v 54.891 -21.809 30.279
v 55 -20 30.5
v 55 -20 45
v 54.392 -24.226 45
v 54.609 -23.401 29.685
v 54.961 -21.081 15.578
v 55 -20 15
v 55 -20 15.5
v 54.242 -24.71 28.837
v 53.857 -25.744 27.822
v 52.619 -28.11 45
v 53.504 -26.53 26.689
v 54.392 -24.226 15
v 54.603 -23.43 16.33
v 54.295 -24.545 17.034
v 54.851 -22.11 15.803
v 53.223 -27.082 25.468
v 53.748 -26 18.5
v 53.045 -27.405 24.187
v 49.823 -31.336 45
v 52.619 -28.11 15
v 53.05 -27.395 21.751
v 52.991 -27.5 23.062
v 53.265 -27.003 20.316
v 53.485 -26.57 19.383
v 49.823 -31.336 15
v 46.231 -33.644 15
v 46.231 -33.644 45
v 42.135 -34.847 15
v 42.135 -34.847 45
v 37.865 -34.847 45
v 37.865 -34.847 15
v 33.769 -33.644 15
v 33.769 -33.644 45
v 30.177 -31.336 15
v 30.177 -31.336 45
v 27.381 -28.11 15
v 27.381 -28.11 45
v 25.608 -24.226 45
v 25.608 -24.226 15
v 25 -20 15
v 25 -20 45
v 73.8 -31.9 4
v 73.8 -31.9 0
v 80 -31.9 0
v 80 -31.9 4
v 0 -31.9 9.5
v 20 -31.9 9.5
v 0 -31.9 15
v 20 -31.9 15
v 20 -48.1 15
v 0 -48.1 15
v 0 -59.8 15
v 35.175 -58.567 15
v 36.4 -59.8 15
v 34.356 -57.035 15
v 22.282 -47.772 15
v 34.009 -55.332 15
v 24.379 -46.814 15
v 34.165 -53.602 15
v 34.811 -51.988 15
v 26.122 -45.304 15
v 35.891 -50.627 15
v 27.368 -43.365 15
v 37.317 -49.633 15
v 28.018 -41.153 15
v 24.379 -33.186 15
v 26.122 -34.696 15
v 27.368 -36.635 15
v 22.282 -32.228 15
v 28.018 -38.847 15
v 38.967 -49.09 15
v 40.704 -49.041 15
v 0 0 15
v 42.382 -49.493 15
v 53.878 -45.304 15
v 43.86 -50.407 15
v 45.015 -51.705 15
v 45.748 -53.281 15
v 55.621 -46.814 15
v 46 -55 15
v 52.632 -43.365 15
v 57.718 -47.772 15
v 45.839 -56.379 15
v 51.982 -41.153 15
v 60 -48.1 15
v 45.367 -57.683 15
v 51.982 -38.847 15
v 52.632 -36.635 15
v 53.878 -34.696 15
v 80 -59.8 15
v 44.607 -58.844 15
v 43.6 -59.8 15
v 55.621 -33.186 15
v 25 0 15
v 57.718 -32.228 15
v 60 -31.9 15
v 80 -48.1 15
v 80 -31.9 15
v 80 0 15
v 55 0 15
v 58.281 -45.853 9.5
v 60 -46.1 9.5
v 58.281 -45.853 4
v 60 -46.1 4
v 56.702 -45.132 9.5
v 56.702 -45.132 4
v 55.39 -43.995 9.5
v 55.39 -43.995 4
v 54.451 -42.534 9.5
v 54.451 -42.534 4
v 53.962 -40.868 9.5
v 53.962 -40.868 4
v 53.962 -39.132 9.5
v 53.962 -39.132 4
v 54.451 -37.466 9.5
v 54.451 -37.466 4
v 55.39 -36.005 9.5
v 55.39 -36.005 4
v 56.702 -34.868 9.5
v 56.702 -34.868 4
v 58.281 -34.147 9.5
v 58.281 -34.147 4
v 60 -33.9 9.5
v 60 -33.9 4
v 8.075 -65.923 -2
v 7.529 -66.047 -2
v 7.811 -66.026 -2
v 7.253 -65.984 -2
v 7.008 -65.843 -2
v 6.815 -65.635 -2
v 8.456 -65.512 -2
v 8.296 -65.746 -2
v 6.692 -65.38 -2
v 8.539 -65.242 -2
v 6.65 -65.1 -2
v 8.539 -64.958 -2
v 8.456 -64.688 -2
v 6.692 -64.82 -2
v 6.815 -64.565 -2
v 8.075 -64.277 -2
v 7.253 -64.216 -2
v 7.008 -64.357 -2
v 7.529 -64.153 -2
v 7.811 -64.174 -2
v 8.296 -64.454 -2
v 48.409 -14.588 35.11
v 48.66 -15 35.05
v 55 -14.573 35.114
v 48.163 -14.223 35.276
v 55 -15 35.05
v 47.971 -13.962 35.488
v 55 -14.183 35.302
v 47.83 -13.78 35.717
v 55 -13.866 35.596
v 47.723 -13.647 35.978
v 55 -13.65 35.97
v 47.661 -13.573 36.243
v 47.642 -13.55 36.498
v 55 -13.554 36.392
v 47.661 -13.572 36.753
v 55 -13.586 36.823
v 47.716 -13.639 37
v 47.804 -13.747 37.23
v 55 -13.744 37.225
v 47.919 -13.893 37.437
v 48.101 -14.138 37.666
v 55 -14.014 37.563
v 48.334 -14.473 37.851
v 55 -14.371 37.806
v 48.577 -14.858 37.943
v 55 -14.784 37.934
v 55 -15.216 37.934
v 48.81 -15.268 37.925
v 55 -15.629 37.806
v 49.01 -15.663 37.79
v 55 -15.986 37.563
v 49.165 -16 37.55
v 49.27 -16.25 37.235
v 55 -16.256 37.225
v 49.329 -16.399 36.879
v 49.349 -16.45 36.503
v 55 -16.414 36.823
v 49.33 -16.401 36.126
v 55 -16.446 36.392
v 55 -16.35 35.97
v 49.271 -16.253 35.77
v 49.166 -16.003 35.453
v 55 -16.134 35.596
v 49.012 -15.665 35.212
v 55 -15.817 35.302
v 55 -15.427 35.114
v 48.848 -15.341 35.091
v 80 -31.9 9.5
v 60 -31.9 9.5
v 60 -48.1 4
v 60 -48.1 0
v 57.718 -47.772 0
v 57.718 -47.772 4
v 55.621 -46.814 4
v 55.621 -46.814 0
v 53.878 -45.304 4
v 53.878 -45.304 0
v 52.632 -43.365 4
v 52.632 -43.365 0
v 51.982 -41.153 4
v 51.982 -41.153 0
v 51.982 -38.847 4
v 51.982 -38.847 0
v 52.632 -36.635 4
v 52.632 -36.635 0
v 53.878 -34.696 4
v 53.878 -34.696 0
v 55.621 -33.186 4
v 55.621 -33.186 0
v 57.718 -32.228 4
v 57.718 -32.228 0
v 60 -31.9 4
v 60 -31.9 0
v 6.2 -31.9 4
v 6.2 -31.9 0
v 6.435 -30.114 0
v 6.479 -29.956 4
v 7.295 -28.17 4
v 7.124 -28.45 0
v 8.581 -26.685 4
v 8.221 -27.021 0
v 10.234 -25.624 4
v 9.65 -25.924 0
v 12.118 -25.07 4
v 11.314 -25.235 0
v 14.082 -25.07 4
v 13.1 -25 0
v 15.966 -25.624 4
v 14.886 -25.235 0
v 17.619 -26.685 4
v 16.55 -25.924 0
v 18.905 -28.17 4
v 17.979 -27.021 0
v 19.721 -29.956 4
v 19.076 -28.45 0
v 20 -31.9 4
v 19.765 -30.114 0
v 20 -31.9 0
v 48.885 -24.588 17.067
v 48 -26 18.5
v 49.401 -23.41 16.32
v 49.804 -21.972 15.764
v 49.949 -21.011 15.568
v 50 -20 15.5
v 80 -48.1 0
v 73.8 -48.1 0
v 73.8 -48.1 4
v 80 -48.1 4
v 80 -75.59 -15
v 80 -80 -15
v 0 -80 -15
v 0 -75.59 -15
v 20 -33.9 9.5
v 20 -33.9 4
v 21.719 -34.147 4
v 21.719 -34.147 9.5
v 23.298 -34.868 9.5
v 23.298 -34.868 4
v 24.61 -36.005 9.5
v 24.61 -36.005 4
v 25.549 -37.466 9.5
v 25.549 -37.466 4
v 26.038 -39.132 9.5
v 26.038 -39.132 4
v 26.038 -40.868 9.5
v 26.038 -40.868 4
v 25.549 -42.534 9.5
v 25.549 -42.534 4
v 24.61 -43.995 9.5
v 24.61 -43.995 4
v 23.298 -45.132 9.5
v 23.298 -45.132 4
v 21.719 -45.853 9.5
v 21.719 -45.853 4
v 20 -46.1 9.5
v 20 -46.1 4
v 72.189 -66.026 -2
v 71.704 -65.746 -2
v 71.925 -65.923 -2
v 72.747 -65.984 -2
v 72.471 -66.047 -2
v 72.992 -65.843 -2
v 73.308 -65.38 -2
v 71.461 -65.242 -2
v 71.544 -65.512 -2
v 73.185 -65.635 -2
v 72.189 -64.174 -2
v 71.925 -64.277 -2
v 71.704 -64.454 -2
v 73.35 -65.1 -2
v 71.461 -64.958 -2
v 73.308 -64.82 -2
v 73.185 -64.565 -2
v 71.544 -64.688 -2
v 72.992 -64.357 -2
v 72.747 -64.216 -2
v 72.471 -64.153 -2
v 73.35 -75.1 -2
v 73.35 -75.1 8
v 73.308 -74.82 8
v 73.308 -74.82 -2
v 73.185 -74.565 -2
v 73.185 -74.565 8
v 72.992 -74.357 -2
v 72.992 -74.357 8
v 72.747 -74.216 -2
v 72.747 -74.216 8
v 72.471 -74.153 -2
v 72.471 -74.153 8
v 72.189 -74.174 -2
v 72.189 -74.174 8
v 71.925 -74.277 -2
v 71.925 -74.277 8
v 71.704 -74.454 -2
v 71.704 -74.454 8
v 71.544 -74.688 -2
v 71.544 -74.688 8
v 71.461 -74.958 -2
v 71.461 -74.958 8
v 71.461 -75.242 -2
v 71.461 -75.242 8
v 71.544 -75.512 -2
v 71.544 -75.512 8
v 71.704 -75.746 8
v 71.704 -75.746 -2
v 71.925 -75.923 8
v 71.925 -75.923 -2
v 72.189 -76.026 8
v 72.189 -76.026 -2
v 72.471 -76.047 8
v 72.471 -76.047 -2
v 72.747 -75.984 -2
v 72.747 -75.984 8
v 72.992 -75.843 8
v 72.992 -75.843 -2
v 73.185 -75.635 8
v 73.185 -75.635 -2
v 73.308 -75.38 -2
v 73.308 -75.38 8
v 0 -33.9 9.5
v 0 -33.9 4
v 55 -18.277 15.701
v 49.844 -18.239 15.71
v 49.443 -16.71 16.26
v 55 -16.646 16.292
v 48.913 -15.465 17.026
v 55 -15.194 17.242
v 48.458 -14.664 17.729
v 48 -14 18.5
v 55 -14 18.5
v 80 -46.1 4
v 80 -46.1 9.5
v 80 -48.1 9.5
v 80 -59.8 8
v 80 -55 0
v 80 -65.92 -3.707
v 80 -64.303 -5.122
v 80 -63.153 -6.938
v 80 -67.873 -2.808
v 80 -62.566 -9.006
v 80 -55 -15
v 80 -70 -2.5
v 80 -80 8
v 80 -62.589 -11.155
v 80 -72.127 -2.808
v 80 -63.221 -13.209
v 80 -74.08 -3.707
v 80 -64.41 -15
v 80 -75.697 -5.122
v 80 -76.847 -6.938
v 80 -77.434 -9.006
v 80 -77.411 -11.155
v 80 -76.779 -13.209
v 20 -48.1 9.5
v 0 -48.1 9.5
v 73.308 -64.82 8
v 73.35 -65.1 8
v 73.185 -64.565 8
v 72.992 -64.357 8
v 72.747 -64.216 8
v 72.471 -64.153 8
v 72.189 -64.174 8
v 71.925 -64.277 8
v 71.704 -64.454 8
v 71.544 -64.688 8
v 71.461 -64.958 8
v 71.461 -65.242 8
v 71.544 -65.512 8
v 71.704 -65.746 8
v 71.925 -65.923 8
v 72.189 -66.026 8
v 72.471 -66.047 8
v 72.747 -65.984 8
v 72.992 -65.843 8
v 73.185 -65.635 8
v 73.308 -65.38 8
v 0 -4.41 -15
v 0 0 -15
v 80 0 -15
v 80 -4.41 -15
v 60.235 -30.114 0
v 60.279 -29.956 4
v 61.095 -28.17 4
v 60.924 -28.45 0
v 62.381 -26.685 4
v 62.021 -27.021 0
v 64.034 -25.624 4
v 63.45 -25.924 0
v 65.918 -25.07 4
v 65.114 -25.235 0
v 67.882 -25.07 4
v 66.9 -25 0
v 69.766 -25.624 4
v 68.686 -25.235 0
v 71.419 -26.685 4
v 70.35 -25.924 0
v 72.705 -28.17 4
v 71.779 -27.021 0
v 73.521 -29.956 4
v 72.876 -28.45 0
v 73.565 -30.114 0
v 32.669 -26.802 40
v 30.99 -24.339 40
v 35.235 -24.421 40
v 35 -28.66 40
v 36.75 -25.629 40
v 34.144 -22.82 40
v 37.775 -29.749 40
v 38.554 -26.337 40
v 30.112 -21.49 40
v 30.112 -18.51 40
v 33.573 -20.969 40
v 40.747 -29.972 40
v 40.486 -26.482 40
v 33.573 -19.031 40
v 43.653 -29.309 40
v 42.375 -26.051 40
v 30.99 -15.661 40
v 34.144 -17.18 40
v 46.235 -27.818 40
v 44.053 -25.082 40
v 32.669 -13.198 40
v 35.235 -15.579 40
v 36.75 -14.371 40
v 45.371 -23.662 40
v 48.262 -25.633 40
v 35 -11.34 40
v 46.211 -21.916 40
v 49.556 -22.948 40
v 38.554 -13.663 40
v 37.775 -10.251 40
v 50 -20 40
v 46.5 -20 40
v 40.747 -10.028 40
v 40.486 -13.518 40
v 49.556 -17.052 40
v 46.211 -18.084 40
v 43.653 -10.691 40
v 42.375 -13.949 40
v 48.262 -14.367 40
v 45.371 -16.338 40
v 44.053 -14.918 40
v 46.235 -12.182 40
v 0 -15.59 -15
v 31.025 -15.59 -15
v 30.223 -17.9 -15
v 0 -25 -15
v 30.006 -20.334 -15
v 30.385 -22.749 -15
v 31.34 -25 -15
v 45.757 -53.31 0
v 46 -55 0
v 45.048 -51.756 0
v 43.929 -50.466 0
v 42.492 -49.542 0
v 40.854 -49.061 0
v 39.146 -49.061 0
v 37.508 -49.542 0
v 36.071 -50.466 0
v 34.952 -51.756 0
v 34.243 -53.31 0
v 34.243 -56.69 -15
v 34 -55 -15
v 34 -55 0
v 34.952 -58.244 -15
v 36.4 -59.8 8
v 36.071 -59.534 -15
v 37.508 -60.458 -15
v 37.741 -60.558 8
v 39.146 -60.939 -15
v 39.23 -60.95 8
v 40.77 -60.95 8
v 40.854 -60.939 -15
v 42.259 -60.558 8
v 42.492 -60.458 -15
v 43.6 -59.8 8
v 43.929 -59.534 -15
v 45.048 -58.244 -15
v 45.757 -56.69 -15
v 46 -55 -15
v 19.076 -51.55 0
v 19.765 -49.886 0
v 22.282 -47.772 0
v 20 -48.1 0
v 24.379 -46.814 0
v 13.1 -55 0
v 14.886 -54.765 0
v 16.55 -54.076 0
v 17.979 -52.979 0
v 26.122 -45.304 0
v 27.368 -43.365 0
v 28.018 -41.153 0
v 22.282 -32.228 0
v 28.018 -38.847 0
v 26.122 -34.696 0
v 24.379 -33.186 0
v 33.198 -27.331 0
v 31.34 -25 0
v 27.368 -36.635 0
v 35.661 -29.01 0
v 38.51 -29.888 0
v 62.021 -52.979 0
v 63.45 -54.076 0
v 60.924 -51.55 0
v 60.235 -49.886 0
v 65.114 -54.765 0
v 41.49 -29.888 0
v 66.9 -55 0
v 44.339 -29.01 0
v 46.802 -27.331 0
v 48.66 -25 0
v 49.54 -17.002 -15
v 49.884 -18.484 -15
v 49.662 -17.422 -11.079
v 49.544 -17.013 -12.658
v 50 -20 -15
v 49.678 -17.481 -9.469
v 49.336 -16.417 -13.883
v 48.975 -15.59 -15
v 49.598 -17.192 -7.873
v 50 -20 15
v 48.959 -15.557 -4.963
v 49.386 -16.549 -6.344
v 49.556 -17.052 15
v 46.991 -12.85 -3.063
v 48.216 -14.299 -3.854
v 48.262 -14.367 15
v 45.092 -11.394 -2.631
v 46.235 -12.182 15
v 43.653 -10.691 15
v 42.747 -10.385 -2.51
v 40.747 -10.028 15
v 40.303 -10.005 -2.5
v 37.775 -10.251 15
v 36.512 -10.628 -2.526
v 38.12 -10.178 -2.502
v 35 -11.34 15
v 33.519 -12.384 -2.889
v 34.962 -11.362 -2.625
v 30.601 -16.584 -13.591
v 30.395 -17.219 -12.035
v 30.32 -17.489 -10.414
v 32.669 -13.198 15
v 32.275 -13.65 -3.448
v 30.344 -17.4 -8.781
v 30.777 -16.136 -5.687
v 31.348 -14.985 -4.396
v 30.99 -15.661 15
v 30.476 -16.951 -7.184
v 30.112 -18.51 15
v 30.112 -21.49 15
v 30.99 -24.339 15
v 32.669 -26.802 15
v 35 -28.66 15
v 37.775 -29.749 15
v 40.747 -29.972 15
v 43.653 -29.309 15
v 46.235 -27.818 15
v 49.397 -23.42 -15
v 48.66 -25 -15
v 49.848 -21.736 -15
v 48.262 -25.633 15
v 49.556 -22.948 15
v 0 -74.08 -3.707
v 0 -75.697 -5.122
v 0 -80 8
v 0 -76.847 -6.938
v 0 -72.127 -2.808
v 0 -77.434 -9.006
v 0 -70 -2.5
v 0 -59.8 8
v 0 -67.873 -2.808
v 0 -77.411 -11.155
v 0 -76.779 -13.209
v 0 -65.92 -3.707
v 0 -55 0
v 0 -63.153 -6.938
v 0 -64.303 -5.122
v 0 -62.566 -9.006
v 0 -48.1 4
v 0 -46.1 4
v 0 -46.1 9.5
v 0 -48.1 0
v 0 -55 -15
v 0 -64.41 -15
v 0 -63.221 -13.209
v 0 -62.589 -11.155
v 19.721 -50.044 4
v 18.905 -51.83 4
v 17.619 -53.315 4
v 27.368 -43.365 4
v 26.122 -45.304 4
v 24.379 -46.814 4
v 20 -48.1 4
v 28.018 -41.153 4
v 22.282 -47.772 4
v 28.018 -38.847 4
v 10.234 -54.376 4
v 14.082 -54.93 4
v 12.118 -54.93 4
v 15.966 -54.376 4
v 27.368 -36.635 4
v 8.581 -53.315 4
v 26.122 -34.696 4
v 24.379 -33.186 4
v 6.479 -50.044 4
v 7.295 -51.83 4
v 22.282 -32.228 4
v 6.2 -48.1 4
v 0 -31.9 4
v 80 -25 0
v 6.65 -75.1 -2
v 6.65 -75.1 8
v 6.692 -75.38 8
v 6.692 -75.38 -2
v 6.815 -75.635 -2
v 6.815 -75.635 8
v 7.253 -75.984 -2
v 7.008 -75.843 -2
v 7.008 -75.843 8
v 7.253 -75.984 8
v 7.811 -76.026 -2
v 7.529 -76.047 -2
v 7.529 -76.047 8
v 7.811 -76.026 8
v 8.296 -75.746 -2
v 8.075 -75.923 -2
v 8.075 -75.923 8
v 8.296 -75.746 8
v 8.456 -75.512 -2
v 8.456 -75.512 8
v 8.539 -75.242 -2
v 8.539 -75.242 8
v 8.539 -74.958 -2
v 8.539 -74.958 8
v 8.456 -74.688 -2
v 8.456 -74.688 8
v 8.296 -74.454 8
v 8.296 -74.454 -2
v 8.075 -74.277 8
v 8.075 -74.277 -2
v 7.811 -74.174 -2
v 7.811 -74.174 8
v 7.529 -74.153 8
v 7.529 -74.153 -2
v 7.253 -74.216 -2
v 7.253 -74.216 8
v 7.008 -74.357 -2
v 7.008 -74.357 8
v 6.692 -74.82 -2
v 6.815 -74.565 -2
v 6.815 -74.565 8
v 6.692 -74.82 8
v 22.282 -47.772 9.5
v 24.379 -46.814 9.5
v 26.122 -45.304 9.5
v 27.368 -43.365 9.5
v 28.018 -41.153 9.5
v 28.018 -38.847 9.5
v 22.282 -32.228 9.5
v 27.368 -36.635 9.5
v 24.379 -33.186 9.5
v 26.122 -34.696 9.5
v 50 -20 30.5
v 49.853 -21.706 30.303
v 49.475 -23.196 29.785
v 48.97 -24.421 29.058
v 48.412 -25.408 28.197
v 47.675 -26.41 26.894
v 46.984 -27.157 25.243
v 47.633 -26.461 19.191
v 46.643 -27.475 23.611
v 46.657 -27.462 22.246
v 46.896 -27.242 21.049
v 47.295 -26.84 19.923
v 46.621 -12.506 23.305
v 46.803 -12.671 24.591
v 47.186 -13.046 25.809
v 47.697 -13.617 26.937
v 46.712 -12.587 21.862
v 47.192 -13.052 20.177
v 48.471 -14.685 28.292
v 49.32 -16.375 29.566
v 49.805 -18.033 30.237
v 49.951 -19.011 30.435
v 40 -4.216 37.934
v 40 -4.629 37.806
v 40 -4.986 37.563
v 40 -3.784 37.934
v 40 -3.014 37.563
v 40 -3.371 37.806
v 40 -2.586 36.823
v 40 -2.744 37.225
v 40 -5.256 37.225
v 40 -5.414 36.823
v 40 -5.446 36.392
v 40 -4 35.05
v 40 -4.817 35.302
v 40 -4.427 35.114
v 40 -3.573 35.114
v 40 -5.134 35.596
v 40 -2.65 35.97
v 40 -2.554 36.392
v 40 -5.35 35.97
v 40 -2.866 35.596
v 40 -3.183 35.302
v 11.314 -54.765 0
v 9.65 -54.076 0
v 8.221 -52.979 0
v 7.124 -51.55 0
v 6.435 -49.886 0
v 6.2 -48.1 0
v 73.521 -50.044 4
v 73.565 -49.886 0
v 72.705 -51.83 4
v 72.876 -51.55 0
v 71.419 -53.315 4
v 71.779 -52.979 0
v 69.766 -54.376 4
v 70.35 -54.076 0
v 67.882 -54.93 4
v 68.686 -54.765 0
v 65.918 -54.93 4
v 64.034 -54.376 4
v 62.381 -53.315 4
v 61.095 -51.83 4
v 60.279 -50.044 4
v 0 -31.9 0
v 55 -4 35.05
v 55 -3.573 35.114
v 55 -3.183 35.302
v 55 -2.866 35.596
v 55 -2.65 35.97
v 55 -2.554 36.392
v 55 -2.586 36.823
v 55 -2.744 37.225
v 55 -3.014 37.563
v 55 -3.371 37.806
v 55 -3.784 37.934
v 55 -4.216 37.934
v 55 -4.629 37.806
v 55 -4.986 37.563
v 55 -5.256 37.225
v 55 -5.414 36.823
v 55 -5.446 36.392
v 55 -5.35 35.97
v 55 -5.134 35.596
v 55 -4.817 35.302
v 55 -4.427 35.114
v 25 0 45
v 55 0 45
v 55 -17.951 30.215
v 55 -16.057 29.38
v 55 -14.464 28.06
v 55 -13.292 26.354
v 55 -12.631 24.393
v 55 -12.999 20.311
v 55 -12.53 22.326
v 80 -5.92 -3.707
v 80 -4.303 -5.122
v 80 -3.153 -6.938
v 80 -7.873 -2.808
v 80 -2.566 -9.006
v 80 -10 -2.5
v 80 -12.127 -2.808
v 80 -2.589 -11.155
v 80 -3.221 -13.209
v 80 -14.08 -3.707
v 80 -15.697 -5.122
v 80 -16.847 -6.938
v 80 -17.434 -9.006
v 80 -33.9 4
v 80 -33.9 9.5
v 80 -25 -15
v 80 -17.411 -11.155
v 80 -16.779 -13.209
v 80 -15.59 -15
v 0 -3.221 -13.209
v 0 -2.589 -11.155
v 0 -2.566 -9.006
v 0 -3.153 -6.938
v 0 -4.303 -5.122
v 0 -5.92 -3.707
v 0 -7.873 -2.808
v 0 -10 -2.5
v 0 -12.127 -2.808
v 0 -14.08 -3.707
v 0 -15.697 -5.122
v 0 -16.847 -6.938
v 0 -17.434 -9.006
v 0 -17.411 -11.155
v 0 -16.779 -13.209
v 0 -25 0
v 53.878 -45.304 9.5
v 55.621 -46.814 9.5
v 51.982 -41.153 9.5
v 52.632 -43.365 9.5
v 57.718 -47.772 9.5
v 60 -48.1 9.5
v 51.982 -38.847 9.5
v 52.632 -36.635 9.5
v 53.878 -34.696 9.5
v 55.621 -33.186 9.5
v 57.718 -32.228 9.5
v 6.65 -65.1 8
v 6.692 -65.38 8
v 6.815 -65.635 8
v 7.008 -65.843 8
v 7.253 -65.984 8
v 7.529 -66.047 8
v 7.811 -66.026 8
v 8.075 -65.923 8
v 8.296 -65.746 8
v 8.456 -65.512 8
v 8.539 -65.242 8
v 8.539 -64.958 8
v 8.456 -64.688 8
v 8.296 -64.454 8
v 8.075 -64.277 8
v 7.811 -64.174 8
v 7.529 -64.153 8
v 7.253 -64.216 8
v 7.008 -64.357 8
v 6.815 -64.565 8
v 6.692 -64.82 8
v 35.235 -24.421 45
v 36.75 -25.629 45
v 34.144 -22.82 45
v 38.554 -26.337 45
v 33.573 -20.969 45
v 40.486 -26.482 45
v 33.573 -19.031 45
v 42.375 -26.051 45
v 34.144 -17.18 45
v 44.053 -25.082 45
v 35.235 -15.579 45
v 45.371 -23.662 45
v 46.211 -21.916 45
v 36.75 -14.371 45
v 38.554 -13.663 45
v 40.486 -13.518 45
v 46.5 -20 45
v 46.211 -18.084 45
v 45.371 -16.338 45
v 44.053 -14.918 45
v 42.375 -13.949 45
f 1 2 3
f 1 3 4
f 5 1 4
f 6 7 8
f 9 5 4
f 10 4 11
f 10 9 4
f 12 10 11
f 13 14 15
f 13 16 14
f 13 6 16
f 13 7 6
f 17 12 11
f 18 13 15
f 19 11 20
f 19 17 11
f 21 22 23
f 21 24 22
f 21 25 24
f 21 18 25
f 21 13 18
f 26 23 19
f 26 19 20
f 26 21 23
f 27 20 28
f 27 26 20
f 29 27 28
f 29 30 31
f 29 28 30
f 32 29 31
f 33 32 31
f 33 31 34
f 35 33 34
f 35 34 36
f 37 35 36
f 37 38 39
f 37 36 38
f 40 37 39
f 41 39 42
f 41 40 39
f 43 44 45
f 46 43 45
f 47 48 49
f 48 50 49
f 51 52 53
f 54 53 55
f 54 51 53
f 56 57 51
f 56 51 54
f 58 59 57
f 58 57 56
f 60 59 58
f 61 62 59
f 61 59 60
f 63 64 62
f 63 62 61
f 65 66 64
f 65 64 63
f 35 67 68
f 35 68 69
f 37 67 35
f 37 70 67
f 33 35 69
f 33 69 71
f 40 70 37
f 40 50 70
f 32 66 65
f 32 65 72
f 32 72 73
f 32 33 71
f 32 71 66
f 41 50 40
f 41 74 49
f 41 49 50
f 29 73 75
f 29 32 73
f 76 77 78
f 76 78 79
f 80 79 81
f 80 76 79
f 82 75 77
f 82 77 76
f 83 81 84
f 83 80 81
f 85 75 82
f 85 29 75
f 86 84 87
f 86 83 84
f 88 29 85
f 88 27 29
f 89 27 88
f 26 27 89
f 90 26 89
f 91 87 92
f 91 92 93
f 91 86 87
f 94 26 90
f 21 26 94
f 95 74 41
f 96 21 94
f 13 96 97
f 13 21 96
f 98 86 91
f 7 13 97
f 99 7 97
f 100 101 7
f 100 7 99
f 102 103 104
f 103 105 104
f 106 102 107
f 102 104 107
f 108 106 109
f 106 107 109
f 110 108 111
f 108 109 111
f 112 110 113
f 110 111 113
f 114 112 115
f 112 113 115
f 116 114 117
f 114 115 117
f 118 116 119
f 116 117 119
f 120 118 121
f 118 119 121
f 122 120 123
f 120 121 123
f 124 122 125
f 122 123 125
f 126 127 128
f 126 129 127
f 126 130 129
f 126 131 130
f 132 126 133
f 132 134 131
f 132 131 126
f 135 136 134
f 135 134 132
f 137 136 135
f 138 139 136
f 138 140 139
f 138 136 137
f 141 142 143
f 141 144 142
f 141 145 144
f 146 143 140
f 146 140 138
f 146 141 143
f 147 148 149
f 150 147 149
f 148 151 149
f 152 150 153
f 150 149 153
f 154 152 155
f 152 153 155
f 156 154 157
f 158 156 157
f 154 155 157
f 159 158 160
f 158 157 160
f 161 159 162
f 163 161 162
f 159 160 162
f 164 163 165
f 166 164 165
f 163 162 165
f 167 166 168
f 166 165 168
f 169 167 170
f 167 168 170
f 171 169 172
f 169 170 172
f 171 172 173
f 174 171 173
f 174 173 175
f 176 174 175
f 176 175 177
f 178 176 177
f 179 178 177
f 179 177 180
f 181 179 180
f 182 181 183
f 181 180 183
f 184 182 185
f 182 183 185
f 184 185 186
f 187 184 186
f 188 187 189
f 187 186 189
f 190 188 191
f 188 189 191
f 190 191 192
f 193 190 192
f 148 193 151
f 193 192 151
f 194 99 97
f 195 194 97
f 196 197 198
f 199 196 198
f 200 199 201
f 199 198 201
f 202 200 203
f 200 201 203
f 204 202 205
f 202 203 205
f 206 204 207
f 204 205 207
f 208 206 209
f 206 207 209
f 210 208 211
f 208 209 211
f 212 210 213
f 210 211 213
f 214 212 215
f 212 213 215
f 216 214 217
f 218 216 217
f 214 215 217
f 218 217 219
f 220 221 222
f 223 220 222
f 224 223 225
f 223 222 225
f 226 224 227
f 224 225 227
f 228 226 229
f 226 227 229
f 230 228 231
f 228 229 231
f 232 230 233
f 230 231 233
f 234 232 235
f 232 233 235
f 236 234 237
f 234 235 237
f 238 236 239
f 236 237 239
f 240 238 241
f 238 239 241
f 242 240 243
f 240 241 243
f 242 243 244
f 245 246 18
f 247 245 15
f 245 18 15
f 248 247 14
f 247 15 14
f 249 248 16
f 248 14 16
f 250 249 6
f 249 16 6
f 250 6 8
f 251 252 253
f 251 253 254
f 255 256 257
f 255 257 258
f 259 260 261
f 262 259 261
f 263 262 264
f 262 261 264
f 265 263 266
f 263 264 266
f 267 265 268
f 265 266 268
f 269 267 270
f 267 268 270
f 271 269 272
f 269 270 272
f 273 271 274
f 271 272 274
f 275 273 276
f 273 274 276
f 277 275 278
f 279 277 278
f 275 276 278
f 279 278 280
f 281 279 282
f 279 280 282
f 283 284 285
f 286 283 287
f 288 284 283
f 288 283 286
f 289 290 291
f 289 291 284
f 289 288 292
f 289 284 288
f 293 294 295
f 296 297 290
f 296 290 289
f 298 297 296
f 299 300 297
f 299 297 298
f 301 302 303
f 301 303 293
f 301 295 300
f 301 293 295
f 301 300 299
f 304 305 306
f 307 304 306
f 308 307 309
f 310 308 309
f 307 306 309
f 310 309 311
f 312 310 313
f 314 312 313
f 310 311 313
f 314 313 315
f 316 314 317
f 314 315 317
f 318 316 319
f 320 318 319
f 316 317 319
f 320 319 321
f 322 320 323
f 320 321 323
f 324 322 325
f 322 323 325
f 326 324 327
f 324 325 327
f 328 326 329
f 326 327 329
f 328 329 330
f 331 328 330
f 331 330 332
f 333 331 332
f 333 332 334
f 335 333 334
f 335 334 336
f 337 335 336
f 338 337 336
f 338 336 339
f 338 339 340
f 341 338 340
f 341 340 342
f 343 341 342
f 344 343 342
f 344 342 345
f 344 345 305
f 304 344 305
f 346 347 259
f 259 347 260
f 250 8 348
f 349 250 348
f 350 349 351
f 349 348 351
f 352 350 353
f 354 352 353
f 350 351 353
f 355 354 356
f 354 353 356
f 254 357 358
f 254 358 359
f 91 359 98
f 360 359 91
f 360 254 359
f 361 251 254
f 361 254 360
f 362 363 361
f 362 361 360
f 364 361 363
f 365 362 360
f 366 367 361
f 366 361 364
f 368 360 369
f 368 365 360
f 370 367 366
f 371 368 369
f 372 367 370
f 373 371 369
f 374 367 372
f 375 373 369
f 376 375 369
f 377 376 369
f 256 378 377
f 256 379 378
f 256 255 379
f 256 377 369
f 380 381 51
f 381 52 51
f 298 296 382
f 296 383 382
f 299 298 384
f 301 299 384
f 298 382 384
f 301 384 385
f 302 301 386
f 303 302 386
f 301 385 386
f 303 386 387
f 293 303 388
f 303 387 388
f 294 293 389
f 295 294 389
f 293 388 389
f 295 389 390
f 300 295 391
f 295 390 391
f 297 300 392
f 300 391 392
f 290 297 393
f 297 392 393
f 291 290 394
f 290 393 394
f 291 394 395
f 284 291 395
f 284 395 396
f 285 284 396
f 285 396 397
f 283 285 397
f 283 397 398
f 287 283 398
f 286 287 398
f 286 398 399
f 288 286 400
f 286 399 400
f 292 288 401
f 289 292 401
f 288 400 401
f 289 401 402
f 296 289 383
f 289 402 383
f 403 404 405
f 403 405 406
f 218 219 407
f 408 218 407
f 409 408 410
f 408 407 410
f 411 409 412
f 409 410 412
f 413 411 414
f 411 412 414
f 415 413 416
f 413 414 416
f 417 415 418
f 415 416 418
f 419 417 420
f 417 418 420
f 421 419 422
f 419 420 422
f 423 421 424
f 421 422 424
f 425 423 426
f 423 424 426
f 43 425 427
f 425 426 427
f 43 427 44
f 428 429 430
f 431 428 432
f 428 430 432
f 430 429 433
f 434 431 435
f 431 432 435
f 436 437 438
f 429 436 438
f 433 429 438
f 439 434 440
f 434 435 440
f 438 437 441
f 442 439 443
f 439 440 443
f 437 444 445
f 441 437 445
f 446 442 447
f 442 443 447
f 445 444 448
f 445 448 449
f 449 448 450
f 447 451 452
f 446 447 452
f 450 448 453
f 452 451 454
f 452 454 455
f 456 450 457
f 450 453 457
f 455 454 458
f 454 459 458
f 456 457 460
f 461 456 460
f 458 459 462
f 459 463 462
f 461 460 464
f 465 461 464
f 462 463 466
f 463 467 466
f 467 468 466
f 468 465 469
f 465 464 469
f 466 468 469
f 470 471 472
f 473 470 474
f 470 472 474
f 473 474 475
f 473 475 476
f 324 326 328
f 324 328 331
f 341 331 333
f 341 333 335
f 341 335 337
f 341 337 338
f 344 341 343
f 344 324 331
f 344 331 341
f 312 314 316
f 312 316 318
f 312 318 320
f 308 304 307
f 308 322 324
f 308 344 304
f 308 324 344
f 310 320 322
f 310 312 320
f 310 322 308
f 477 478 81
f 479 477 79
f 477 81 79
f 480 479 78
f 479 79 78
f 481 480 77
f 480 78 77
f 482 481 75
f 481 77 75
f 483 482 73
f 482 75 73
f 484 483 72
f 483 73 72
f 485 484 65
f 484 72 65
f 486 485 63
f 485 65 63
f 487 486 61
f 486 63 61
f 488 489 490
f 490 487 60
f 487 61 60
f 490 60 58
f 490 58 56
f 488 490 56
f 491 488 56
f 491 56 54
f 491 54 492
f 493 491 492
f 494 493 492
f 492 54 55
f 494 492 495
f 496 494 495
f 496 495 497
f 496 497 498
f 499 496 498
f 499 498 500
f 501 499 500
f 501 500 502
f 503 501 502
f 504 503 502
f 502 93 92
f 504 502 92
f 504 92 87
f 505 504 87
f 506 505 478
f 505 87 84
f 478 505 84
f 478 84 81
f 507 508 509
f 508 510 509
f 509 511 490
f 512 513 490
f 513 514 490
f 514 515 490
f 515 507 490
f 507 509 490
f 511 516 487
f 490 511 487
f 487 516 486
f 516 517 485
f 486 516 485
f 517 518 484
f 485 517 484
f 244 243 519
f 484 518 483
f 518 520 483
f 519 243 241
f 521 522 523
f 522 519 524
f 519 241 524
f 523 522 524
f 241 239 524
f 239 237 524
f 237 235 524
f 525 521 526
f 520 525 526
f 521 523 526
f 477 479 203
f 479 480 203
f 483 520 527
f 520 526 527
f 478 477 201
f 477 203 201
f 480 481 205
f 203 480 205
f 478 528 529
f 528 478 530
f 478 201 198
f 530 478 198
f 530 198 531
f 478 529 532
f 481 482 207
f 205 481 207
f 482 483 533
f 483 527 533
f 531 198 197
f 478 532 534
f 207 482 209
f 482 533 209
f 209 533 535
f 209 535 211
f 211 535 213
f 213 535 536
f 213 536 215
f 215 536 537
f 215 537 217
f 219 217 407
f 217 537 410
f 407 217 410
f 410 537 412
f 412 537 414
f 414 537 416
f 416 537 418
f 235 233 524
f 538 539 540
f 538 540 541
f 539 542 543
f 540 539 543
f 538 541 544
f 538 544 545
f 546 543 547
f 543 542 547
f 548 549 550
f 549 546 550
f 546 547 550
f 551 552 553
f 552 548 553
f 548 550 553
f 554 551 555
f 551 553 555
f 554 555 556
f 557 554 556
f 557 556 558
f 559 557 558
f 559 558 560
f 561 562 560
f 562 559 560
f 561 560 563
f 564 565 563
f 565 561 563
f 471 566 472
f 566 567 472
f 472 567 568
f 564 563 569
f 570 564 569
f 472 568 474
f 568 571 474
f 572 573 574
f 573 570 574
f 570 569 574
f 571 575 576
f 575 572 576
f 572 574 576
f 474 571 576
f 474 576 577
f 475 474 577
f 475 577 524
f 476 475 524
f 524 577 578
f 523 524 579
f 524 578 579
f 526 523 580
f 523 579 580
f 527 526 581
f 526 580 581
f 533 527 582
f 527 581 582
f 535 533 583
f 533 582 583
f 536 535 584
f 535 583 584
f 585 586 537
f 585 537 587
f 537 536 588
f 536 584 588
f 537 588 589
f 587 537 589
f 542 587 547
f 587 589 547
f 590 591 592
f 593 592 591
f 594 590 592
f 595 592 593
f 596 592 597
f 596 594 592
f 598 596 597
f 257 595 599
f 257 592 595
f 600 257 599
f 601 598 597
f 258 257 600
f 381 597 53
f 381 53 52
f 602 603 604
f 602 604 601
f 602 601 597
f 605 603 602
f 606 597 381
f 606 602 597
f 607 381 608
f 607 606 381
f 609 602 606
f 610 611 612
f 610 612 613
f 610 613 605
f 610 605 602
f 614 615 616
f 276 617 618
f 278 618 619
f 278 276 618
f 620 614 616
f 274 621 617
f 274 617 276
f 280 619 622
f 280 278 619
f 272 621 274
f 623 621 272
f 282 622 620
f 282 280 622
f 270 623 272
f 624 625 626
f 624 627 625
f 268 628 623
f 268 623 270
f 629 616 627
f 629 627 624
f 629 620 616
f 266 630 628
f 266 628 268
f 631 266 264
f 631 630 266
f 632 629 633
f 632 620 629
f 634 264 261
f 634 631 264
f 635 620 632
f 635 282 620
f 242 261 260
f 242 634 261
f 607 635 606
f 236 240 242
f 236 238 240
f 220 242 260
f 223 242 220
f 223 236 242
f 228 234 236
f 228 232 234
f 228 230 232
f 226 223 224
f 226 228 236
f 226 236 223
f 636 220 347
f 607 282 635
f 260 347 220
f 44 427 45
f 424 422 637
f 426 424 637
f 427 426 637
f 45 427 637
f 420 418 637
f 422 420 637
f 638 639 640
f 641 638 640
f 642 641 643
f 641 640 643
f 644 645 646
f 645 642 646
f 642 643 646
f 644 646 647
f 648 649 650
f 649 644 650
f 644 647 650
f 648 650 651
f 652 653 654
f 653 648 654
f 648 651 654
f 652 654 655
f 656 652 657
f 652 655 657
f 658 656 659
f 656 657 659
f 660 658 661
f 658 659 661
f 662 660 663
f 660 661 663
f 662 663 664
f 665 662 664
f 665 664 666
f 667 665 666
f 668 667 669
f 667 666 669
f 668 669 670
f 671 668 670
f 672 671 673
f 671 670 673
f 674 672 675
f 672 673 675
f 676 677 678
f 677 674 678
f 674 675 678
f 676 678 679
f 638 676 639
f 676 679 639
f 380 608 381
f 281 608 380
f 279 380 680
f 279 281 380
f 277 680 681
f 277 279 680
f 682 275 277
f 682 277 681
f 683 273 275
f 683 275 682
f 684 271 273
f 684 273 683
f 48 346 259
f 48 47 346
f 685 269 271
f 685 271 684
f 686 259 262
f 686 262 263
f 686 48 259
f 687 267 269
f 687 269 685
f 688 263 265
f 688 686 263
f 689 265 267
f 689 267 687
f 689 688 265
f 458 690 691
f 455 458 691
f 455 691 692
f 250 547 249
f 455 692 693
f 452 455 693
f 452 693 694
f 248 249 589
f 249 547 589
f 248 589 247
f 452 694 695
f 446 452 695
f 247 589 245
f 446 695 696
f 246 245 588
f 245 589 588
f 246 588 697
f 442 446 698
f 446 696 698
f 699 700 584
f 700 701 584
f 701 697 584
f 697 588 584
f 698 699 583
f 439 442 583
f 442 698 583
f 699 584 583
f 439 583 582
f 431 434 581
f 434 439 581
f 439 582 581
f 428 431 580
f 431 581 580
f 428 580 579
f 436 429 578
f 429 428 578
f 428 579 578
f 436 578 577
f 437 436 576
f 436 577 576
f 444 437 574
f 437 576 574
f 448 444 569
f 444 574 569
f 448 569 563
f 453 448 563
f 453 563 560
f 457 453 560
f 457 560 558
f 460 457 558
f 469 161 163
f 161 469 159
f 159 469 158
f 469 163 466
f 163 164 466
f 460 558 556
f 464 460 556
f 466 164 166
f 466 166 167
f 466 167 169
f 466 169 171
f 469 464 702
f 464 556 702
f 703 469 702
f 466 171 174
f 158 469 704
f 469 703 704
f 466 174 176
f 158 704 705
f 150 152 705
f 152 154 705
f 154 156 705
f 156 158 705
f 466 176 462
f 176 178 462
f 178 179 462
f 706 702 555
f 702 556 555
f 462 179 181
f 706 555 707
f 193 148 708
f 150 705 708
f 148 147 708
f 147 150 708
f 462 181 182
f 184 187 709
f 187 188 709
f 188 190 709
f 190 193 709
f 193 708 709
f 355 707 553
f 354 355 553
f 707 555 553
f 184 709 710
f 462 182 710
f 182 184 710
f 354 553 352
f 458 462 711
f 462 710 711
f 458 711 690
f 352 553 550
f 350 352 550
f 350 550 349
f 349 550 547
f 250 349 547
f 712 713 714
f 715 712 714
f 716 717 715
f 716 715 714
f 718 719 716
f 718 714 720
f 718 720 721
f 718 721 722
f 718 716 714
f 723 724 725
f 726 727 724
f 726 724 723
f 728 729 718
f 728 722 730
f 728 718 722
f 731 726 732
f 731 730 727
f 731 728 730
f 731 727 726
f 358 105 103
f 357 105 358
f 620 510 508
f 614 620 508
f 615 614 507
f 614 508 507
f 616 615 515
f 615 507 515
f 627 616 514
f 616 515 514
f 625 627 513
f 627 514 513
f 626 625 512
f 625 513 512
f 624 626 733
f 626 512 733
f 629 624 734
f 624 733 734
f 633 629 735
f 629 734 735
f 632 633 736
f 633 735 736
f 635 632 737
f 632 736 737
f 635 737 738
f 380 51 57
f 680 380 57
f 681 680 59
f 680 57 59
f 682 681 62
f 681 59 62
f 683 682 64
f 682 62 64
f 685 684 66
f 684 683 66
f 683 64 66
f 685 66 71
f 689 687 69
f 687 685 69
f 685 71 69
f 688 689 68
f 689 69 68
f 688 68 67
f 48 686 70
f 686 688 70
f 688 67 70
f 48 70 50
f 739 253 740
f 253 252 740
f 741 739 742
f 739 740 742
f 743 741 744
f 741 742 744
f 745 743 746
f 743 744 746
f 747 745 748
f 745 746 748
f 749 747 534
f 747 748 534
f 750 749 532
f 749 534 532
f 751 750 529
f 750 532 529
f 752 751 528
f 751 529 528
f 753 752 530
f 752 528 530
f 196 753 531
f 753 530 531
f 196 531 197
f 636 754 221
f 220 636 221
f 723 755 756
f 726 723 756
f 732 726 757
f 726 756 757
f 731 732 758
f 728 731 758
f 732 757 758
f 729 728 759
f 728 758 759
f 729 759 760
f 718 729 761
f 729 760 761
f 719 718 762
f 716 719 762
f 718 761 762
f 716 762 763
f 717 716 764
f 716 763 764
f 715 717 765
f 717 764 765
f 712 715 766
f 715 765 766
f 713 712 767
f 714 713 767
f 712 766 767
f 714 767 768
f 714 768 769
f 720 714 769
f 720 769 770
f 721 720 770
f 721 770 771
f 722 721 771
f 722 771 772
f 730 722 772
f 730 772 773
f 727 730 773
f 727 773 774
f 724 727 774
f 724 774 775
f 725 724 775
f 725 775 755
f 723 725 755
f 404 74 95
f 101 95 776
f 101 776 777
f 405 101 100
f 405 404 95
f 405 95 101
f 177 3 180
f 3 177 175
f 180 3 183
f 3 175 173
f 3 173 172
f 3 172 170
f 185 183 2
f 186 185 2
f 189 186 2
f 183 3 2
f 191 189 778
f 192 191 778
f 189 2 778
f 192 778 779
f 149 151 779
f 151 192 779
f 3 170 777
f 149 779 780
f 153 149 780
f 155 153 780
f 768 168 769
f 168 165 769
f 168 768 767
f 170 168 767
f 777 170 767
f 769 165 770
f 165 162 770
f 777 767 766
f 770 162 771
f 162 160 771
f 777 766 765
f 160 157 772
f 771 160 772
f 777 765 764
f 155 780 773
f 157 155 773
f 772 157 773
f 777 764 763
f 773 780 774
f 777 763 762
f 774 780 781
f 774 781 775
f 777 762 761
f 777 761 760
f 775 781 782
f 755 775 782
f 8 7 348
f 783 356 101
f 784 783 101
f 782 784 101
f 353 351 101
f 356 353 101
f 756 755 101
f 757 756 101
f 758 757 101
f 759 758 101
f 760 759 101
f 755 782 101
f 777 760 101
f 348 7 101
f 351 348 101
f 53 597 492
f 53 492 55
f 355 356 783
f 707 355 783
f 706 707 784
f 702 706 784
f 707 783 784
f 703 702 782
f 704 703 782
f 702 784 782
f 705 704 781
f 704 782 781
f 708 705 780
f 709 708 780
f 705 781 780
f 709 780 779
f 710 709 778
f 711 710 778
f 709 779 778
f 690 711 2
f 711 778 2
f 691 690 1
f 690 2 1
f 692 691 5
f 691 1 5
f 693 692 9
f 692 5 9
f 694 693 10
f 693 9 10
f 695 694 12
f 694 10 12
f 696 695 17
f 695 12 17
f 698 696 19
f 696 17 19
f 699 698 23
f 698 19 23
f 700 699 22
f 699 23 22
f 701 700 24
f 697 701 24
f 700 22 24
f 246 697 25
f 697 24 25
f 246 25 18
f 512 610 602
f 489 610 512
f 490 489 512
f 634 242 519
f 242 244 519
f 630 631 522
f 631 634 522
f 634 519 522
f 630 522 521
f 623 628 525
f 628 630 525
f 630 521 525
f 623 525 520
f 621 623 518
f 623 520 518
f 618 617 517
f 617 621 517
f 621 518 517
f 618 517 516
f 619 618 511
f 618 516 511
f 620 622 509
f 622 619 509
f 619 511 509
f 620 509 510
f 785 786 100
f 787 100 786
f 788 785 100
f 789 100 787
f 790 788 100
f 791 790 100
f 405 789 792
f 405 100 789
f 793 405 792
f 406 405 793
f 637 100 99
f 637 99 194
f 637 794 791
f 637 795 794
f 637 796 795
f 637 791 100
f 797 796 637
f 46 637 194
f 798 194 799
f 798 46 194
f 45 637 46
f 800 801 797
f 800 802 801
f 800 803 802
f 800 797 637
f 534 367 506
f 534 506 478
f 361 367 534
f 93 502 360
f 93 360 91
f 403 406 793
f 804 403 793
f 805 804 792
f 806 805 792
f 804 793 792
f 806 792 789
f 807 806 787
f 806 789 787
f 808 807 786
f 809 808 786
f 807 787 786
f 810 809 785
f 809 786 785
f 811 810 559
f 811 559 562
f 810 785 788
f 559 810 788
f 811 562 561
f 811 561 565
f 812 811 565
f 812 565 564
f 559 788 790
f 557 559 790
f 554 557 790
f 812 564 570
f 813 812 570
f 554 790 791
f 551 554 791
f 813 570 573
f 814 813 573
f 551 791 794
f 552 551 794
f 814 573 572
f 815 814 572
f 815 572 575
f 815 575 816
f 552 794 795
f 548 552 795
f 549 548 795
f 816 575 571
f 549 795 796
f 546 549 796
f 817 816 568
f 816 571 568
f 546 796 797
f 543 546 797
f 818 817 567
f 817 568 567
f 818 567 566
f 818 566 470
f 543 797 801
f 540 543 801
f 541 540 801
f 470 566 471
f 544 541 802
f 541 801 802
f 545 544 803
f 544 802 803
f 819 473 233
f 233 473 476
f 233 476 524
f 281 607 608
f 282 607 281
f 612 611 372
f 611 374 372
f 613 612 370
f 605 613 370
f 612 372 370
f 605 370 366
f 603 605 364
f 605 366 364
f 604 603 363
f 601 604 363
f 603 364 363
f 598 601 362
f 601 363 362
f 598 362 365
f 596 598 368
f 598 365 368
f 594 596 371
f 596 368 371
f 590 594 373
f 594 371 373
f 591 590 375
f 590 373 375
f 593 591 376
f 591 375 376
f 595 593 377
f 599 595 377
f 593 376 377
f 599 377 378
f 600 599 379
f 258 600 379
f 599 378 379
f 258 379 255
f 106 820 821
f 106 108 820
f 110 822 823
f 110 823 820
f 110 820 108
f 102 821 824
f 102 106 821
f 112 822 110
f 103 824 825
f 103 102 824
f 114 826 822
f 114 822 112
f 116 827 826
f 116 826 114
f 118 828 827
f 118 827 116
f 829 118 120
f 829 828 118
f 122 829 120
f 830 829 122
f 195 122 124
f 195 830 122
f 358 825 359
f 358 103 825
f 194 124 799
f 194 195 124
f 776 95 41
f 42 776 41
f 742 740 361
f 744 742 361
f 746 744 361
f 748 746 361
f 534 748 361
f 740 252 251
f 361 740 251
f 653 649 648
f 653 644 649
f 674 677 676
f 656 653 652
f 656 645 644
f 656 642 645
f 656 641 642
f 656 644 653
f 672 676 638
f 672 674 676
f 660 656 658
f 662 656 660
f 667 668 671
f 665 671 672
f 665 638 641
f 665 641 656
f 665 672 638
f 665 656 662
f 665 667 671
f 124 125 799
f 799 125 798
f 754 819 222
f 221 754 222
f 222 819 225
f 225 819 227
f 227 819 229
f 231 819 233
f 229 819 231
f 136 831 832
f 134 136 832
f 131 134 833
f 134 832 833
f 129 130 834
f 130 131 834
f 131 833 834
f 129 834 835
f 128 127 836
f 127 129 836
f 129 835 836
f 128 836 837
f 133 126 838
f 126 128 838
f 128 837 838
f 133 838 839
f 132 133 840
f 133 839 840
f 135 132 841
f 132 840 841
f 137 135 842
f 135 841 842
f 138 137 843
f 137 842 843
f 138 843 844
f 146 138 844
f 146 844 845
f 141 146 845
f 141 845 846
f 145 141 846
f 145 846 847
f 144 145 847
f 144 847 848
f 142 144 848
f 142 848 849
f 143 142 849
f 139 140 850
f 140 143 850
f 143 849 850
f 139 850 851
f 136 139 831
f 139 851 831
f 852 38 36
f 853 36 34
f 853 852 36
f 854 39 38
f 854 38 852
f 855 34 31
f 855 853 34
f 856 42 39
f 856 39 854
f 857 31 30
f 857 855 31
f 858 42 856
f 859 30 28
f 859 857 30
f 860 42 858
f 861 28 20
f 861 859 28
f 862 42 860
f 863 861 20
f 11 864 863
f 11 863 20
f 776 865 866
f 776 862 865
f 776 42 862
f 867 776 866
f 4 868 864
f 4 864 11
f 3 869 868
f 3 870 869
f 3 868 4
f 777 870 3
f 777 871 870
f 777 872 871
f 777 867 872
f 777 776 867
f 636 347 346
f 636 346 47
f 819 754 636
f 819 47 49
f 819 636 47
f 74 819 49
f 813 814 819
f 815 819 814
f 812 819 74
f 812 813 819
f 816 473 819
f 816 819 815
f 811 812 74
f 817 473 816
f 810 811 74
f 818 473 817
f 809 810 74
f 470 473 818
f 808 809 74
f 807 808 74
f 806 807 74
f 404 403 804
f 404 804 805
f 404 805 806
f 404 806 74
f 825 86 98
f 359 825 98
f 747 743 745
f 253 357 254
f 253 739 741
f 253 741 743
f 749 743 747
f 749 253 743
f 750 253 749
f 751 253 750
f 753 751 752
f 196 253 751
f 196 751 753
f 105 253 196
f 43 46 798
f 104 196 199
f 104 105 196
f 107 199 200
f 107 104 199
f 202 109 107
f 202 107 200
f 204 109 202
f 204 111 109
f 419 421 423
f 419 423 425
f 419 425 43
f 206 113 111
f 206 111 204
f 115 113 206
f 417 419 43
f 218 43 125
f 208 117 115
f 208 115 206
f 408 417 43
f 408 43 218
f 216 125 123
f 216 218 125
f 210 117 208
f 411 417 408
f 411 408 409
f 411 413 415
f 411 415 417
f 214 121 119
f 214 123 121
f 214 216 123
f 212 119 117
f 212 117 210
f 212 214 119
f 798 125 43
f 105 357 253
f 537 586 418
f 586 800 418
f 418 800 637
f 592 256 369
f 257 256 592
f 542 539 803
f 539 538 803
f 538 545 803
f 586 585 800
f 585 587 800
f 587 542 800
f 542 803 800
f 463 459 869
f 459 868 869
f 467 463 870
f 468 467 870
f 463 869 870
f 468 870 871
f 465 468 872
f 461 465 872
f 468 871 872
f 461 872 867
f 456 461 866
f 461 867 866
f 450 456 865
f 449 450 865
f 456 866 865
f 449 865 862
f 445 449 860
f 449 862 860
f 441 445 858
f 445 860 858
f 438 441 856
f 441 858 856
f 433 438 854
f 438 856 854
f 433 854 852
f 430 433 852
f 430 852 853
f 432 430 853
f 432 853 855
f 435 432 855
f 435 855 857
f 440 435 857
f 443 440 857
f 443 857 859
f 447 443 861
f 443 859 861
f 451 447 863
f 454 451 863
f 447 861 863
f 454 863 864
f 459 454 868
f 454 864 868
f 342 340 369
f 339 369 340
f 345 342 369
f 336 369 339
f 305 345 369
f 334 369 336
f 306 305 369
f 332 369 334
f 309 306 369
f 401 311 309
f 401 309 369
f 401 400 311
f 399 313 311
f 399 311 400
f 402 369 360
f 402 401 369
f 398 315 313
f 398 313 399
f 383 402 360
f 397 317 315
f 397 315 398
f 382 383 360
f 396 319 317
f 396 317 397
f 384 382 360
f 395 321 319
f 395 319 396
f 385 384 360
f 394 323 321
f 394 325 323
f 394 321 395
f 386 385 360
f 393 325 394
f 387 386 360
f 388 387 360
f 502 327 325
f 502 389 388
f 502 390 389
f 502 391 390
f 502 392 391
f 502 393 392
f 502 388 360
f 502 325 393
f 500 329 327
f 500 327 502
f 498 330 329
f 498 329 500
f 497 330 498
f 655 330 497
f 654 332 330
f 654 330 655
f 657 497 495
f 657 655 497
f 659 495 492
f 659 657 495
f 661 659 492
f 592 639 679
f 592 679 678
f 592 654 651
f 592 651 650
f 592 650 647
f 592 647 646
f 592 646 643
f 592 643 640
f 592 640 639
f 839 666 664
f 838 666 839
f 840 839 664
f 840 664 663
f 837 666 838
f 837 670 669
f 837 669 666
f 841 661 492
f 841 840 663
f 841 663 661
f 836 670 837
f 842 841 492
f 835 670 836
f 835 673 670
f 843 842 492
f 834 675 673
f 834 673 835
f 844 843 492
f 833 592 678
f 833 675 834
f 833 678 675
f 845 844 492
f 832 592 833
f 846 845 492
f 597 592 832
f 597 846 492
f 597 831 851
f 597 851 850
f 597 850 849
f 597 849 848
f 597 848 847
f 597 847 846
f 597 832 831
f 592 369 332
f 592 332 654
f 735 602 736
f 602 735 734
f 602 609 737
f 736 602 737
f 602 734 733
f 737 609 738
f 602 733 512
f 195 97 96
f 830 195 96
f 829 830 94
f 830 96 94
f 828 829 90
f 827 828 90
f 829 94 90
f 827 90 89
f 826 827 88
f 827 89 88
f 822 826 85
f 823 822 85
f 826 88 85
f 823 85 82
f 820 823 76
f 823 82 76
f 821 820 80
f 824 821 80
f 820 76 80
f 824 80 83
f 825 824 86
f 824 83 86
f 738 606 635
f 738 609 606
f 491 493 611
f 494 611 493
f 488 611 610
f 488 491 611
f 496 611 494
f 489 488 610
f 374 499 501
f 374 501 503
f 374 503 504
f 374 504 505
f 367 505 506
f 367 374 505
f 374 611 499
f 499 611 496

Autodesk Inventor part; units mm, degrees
ref_plane "YZ Plane" through (0, 0, 0) normal (1, 0, 0) x (0, 1, 0)
ref_plane "XZ Plane" through (0, 0, 0) normal (0, 1, 0) x (-1, 0, 0)
ref_plane "XY Plane" through (0, 0, 0) normal (0, 0, 1) x (1, 0, 0)
sketch "Sketch1" plane through (0, 0, 0) normal (0, 0, 1) x (1, 0, 0)
  line L0 (0, 0) -> (80, 0)
  line L1 (80, 0) -> (80, -80)
  line L2 (80, -80) -> (0, -80)
  line L3 (0, -80) -> (0, 0)
  dimension "d0" = 80
  dimension "d1" = 80
extrude "Extrusion1" add sketch "Sketch1" along normal blind 15
sketch "Sketch2" plane through (0, 0, 0) normal (0, 0, -1) x (-1, 0, 0)
  line L0 (0, 0) -> (-80, 0) projected
  circle A0 centre (-60, -40) radius 6.1
  line L1 (-80, 0) -> (-80, -80) projected
  line L2 (-60, -33.9) -> (-80, -33.9)
  line L3 (-80, -80) -> (-80, 0) projected
  line L4 (-60, -46.1) -> (-80, -46.1)
  line L5 (-80, -46.1) -> (-80, -33.9)
  dimension "d7" = 40
  dimension "d8" = 20
  dimension "d9" = 12.2
extrude "Extrusion2" cut sketch "Sketch2" against normal through all
sketch "Sketch3" plane through (0, 0, 0) normal (0, 0, -1) x (-1, 0, 0)
  arc A0 (-60, -46.1) -> (-60, -33.9) centre (-60, -40) ccw projected
  circle A1 centre (-60, -40) radius 8.1
  line L0 (-60, -31.9) -> (-80, -31.9)
  line L1 (-80, -33.9) -> (-80, 0) projected
  line L2 (-60, -48.1) -> (-80, -48.1)
  line L3 (-80, -48.1) -> (-80, -31.9)
  point P0 (0, 0)
  dimension "d12" = 16.2
extrude "Extrusion3" cut sketch "Sketch3" against normal blind 4
sketch "Sketch4" plane through (0, 0, 15) normal (0, 0, 1) x (1, 0, 0)
  line L0 (80, -31.9) -> (60, -31.9) projected
  arc A0 (60, -31.9) -> (60, -48.1) centre (60, -40) ccw projected
  line L1 (60, -48.1) -> (80, -48.1) projected
  line L2 (80, -46.1) -> (60, -46.1) projected
  arc A1 (60, -33.9) -> (60, -46.1) centre (60, -40) ccw projected
  line L3 (60, -33.9) -> (80, -33.9) projected
  line L4 (80, -33.9) -> (80, -31.9)
  line L5 (80, -33.9) -> (80, 0) projected
  line L6 (80, -46.1) -> (80, -48.1)
  line L7 (80, -80) -> (80, -46.1) projected
  point P0 (0, 0)
extrude "Extrusion4" cut sketch "Sketch4" against normal blind 5.5
sketch "Sketch5" plane through (0, 0, 0) normal (0, 0, -1) x (-1, 0, 0)
  arc A0 (-60, -46.1) -> (-60, -33.9) centre (-60, -40) ccw projected
  line L0 (-80, -31.9) -> (-60, -31.9) projected
  circle A1 centre (-60, -40) radius 8.1
  line L1 (-60, -31.9) -> (-60, -31.9)
  line L2 (-73.8, -31.9) -> (-73.8, -48.1)
  line L3 (-60, -48.1) -> (-60, -48.1)
  arc A2 (-60, -48.1) -> (-60, -31.9) centre (-60, -40) ccw projected
  line L4 (-60, -31.9) -> (-60, -31.9)
  line L5 (-60, -31.9) -> (-60, -31.9)
  line L6 (-60, -33.9) -> (-60, -46.1)
  arc A3 (-60, -31.9) -> (-73.8, -31.9) centre (-66.9, -31.9) ccw
  arc A4 (-73.8, -48.1) -> (-60, -48.1) centre (-66.9, -48.1) ccw
  point P0 (0, 0)
  dimension "d17" = 13.8
  dimension "d20" = 16.2
  dimension "d21" = 8.1
  dimension "d37" = 0
extrude "Extrusion5" cut sketch "Sketch5" against normal blind 4 contours A3 L0 | L0 A1 A4 L2
sketch "Sketch6" plane through (80, 0, 15) normal (1, 0, 0) x (0, 0, -1)
  line L0 (15, 0) -> (0, 0) projected
  line L1 (15, 0) -> (30, 0)
  line L2 (30, -25) -> (15, -25)
  line L3 (15, -25) -> (15, 0)
  line L4 (15, -80) -> (0, -80) projected
  line L5 (15, -80) -> (30, -80)
  line L6 (30, -55) -> (15, -55)
  line L7 (15, -55) -> (15, -80)
  arc A0 (30, -4.4098) -> (30, -15.5902) centre (25, -10) ccw
  arc A1 (30, -64.4098) -> (30, -75.5902) centre (25, -70) ccw
  line L8 (30, 0) -> (30, -4.4098)
  line L9 (30, -15.5902) -> (30, -25)
  line L10 (30, -80) -> (30, -75.5902)
  line L11 (30, -64.4098) -> (30, -55)
  dimension "d22" = 25
  dimension "d23" = 25
  dimension "d24" = 15
  dimension "d25" = 15
  dimension "d29" = 15
  dimension "d32" = 15
  dimension "d33" = 5
  dimension "d34" = 5
  dimension "d38" = 15
  dimension "d39" = 15
  dimension "d40" = 60
  dimension "d41" = 10
  dimension "d42" = 10
extrude "Extrusion6" add sketch "Sketch6" against normal blind 80
ref_plane "Work Plane1" through (40, -33.9, 4) normal (1, 0, 0) x (0, 0, -1)
mirror "Mirror1" about plane through (40, -33.9, 4) normal (1, 0, 0) of "Extrusion5", "Extrusion4", "Extrusion3", "Extrusion2"
sketch "Sketch8" plane through (80, -48.1, 4) normal (1, 0, 0) x (0, 0, -1)
  line L0 (-11, 0) -> (-11, -31.9) projected
  line L1 (-11, -31.9) -> (-4, -31.9)
  line L2 (-4, -31.9) -> (-4, -11.7)
  line L3 (-4, -11.7) -> (-11, -11.7)
  line L4 (-11, -11.7) -> (-11, -31.9)
  point P0 (4, 48.1)
  dimension "d49" = 20.2
  dimension "d50" = 7
extrude "Extrusion8" cut sketch "Sketch8" along normal through all both and the other way through all
sketch "Sketch9" plane through (80, -80, 8) normal (0, 0, 1) x (1, 0, 0)
  circle A0 centre (-7.6, 14.9) radius 0.95
  circle A1 centre (-7.6, 4.9) radius 0.95
  line L0 (0, 20.2) -> (0, 0) projected
  line L1 (0, 0) -> (-80, 0) projected
  point P0 (-80, 80)
  dimension "d53" = 1.9
  dimension "d54" = 1.9
  dimension "d55" = 7.6
  dimension "d56" = 7.6
  dimension "d57" = 10
  dimension "d58" = 4.9
extrude "Extrusion9" cut sketch "Sketch9" against normal blind 10
ref_plane "Work Plane2" through (40, -48.1, 4) normal (1, 0, 0) x (0, 0, -1)
mirror "Mirror2" about plane through (40, -48.1, 4) normal (1, 0, 0) of "Extrusion9"
sketch "Sketch10" plane through (0, 0, 15) normal (0, 0, 1) x (1, 0, 0)
  line L0 (80, -55) -> (0, -55) projected
  circle A0 centre (40, -55) radius 6
  point P0 (0, 0)
  dimension "d61" = 12
extrude "Extrusion10" cut sketch "Sketch10" against normal through all
sketch "Sketch11" plane through (0, 0, 15) normal (0, 0, 1) x (1, 0, 0)
  circle A0 centre (40, -20) radius 15
  circle A1 centre (40, -20) radius 10
  line L0 (80, -31.9) -> (80, 0) projected
  line L1 (80, 0) -> (0, 0) projected
  line L2 (55, -20) -> (55, -5)
  line L3 (80, -4.4098) -> (0, -4.4098) projected
  line L4 (55, -5) -> (40, -5)
  line L5 (40, -5) -> (25, -5)
  line L6 (25, -5) -> (25, -20)
  line L7 (55, -5) -> (25, -5)
  line L8 (25, -5) -> (25, 0)
  line L9 (25, 0) -> (55, 0)
  line L10 (55, 0) -> (55, -5)
  dimension "d64" = 30
  dimension "d65" = 20
  dimension "d66" = 40
  dimension "d67" = 20
extrude "Extrusion11" add sketch "Sketch11" along normal blind 30 contours A0 | A0 L4 L2 | L5 L8 L3 L10 L4 | A0 L6 L5 | L3 L8 L1 L10
sketch "Sketch12" plane through (0, 0, 45) normal (0, 0, 1) x (1, 0, 0)
  circle A0 centre (40, -20) radius 10 projected
  circle A1 centre (40, -20) radius 6.5
  point P0 (0, 0)
  dimension "d70" = 13
extrude "Extrusion12" add sketch "Sketch12" against normal blind 5
sketch "Sketch13" plane through (0, 0, 15) normal (0, 0, 1) x (1, 0, 0)
  circle A0 centre (40, -20) radius 6.5 projected
  circle A1 centre (40, -20) radius 10
  point P0 (0, 0)
extrude "Extrusion13" cut sketch "Sketch13" against normal blind 35 contours A0 | A1
sketch "Sketch14" plane through (55, -20, 15) normal (1, 0, 0) x (0, 0, -1)
  circle A0 centre (-21.5, 5) radius 1.45
  circle A1 centre (-21.5, 16) radius 1.45
  line L0 (0, 20) -> (-30, 20) projected
  line L1 (-30, 0) -> (-30, 20) projected
  point P0 (15, 20)
  dimension "d75" = 2.9
  dimension "d76" = 2.9
  dimension "d77" = 11
  dimension "d78" = 4
  dimension "d79" = 8.5
  dimension "d80" = 8.5
extrude "Extrusion14" cut sketch "Sketch14" against normal blind 15
sketch "Sketch15" plane through (55, -20, 15) normal (1, 0, 0) x (0, 0, -1)
  circle A0 centre (-8, 0) radius 7.5
  line L0 (15, -10) -> (-25, -10) projected
  line L1 (4, -6) -> (-11, -6)
  line L2 (4, 6) -> (-11, 6)
  line L3 (0, -11.9) -> (0, 20) projected
  point P0 (15, 20)
  dimension "d83" = 6
  dimension "d84" = 15
  dimension "d85" = 8
extrude "Extrusion15" cut sketch "Sketch15" against normal blind 17 contours A0
equation "\"d24\" = d25"
equation "\"d32\" = d29"
equation "\"d34\" = d33"
equation "\"d75\" = d76"
equation "\"d80\" = d79"
equation "\"RodDiameter\" = 8"
equation "\"VerticalBearingOD\" = 16"
equation "\"PrintingClearance\" = 0.2"
equation "\"d31\" = d30"
equation "\"TubeID\" = 18"
equation "\"d30\" = 5"
properties part number "HotendMountCarriage"
